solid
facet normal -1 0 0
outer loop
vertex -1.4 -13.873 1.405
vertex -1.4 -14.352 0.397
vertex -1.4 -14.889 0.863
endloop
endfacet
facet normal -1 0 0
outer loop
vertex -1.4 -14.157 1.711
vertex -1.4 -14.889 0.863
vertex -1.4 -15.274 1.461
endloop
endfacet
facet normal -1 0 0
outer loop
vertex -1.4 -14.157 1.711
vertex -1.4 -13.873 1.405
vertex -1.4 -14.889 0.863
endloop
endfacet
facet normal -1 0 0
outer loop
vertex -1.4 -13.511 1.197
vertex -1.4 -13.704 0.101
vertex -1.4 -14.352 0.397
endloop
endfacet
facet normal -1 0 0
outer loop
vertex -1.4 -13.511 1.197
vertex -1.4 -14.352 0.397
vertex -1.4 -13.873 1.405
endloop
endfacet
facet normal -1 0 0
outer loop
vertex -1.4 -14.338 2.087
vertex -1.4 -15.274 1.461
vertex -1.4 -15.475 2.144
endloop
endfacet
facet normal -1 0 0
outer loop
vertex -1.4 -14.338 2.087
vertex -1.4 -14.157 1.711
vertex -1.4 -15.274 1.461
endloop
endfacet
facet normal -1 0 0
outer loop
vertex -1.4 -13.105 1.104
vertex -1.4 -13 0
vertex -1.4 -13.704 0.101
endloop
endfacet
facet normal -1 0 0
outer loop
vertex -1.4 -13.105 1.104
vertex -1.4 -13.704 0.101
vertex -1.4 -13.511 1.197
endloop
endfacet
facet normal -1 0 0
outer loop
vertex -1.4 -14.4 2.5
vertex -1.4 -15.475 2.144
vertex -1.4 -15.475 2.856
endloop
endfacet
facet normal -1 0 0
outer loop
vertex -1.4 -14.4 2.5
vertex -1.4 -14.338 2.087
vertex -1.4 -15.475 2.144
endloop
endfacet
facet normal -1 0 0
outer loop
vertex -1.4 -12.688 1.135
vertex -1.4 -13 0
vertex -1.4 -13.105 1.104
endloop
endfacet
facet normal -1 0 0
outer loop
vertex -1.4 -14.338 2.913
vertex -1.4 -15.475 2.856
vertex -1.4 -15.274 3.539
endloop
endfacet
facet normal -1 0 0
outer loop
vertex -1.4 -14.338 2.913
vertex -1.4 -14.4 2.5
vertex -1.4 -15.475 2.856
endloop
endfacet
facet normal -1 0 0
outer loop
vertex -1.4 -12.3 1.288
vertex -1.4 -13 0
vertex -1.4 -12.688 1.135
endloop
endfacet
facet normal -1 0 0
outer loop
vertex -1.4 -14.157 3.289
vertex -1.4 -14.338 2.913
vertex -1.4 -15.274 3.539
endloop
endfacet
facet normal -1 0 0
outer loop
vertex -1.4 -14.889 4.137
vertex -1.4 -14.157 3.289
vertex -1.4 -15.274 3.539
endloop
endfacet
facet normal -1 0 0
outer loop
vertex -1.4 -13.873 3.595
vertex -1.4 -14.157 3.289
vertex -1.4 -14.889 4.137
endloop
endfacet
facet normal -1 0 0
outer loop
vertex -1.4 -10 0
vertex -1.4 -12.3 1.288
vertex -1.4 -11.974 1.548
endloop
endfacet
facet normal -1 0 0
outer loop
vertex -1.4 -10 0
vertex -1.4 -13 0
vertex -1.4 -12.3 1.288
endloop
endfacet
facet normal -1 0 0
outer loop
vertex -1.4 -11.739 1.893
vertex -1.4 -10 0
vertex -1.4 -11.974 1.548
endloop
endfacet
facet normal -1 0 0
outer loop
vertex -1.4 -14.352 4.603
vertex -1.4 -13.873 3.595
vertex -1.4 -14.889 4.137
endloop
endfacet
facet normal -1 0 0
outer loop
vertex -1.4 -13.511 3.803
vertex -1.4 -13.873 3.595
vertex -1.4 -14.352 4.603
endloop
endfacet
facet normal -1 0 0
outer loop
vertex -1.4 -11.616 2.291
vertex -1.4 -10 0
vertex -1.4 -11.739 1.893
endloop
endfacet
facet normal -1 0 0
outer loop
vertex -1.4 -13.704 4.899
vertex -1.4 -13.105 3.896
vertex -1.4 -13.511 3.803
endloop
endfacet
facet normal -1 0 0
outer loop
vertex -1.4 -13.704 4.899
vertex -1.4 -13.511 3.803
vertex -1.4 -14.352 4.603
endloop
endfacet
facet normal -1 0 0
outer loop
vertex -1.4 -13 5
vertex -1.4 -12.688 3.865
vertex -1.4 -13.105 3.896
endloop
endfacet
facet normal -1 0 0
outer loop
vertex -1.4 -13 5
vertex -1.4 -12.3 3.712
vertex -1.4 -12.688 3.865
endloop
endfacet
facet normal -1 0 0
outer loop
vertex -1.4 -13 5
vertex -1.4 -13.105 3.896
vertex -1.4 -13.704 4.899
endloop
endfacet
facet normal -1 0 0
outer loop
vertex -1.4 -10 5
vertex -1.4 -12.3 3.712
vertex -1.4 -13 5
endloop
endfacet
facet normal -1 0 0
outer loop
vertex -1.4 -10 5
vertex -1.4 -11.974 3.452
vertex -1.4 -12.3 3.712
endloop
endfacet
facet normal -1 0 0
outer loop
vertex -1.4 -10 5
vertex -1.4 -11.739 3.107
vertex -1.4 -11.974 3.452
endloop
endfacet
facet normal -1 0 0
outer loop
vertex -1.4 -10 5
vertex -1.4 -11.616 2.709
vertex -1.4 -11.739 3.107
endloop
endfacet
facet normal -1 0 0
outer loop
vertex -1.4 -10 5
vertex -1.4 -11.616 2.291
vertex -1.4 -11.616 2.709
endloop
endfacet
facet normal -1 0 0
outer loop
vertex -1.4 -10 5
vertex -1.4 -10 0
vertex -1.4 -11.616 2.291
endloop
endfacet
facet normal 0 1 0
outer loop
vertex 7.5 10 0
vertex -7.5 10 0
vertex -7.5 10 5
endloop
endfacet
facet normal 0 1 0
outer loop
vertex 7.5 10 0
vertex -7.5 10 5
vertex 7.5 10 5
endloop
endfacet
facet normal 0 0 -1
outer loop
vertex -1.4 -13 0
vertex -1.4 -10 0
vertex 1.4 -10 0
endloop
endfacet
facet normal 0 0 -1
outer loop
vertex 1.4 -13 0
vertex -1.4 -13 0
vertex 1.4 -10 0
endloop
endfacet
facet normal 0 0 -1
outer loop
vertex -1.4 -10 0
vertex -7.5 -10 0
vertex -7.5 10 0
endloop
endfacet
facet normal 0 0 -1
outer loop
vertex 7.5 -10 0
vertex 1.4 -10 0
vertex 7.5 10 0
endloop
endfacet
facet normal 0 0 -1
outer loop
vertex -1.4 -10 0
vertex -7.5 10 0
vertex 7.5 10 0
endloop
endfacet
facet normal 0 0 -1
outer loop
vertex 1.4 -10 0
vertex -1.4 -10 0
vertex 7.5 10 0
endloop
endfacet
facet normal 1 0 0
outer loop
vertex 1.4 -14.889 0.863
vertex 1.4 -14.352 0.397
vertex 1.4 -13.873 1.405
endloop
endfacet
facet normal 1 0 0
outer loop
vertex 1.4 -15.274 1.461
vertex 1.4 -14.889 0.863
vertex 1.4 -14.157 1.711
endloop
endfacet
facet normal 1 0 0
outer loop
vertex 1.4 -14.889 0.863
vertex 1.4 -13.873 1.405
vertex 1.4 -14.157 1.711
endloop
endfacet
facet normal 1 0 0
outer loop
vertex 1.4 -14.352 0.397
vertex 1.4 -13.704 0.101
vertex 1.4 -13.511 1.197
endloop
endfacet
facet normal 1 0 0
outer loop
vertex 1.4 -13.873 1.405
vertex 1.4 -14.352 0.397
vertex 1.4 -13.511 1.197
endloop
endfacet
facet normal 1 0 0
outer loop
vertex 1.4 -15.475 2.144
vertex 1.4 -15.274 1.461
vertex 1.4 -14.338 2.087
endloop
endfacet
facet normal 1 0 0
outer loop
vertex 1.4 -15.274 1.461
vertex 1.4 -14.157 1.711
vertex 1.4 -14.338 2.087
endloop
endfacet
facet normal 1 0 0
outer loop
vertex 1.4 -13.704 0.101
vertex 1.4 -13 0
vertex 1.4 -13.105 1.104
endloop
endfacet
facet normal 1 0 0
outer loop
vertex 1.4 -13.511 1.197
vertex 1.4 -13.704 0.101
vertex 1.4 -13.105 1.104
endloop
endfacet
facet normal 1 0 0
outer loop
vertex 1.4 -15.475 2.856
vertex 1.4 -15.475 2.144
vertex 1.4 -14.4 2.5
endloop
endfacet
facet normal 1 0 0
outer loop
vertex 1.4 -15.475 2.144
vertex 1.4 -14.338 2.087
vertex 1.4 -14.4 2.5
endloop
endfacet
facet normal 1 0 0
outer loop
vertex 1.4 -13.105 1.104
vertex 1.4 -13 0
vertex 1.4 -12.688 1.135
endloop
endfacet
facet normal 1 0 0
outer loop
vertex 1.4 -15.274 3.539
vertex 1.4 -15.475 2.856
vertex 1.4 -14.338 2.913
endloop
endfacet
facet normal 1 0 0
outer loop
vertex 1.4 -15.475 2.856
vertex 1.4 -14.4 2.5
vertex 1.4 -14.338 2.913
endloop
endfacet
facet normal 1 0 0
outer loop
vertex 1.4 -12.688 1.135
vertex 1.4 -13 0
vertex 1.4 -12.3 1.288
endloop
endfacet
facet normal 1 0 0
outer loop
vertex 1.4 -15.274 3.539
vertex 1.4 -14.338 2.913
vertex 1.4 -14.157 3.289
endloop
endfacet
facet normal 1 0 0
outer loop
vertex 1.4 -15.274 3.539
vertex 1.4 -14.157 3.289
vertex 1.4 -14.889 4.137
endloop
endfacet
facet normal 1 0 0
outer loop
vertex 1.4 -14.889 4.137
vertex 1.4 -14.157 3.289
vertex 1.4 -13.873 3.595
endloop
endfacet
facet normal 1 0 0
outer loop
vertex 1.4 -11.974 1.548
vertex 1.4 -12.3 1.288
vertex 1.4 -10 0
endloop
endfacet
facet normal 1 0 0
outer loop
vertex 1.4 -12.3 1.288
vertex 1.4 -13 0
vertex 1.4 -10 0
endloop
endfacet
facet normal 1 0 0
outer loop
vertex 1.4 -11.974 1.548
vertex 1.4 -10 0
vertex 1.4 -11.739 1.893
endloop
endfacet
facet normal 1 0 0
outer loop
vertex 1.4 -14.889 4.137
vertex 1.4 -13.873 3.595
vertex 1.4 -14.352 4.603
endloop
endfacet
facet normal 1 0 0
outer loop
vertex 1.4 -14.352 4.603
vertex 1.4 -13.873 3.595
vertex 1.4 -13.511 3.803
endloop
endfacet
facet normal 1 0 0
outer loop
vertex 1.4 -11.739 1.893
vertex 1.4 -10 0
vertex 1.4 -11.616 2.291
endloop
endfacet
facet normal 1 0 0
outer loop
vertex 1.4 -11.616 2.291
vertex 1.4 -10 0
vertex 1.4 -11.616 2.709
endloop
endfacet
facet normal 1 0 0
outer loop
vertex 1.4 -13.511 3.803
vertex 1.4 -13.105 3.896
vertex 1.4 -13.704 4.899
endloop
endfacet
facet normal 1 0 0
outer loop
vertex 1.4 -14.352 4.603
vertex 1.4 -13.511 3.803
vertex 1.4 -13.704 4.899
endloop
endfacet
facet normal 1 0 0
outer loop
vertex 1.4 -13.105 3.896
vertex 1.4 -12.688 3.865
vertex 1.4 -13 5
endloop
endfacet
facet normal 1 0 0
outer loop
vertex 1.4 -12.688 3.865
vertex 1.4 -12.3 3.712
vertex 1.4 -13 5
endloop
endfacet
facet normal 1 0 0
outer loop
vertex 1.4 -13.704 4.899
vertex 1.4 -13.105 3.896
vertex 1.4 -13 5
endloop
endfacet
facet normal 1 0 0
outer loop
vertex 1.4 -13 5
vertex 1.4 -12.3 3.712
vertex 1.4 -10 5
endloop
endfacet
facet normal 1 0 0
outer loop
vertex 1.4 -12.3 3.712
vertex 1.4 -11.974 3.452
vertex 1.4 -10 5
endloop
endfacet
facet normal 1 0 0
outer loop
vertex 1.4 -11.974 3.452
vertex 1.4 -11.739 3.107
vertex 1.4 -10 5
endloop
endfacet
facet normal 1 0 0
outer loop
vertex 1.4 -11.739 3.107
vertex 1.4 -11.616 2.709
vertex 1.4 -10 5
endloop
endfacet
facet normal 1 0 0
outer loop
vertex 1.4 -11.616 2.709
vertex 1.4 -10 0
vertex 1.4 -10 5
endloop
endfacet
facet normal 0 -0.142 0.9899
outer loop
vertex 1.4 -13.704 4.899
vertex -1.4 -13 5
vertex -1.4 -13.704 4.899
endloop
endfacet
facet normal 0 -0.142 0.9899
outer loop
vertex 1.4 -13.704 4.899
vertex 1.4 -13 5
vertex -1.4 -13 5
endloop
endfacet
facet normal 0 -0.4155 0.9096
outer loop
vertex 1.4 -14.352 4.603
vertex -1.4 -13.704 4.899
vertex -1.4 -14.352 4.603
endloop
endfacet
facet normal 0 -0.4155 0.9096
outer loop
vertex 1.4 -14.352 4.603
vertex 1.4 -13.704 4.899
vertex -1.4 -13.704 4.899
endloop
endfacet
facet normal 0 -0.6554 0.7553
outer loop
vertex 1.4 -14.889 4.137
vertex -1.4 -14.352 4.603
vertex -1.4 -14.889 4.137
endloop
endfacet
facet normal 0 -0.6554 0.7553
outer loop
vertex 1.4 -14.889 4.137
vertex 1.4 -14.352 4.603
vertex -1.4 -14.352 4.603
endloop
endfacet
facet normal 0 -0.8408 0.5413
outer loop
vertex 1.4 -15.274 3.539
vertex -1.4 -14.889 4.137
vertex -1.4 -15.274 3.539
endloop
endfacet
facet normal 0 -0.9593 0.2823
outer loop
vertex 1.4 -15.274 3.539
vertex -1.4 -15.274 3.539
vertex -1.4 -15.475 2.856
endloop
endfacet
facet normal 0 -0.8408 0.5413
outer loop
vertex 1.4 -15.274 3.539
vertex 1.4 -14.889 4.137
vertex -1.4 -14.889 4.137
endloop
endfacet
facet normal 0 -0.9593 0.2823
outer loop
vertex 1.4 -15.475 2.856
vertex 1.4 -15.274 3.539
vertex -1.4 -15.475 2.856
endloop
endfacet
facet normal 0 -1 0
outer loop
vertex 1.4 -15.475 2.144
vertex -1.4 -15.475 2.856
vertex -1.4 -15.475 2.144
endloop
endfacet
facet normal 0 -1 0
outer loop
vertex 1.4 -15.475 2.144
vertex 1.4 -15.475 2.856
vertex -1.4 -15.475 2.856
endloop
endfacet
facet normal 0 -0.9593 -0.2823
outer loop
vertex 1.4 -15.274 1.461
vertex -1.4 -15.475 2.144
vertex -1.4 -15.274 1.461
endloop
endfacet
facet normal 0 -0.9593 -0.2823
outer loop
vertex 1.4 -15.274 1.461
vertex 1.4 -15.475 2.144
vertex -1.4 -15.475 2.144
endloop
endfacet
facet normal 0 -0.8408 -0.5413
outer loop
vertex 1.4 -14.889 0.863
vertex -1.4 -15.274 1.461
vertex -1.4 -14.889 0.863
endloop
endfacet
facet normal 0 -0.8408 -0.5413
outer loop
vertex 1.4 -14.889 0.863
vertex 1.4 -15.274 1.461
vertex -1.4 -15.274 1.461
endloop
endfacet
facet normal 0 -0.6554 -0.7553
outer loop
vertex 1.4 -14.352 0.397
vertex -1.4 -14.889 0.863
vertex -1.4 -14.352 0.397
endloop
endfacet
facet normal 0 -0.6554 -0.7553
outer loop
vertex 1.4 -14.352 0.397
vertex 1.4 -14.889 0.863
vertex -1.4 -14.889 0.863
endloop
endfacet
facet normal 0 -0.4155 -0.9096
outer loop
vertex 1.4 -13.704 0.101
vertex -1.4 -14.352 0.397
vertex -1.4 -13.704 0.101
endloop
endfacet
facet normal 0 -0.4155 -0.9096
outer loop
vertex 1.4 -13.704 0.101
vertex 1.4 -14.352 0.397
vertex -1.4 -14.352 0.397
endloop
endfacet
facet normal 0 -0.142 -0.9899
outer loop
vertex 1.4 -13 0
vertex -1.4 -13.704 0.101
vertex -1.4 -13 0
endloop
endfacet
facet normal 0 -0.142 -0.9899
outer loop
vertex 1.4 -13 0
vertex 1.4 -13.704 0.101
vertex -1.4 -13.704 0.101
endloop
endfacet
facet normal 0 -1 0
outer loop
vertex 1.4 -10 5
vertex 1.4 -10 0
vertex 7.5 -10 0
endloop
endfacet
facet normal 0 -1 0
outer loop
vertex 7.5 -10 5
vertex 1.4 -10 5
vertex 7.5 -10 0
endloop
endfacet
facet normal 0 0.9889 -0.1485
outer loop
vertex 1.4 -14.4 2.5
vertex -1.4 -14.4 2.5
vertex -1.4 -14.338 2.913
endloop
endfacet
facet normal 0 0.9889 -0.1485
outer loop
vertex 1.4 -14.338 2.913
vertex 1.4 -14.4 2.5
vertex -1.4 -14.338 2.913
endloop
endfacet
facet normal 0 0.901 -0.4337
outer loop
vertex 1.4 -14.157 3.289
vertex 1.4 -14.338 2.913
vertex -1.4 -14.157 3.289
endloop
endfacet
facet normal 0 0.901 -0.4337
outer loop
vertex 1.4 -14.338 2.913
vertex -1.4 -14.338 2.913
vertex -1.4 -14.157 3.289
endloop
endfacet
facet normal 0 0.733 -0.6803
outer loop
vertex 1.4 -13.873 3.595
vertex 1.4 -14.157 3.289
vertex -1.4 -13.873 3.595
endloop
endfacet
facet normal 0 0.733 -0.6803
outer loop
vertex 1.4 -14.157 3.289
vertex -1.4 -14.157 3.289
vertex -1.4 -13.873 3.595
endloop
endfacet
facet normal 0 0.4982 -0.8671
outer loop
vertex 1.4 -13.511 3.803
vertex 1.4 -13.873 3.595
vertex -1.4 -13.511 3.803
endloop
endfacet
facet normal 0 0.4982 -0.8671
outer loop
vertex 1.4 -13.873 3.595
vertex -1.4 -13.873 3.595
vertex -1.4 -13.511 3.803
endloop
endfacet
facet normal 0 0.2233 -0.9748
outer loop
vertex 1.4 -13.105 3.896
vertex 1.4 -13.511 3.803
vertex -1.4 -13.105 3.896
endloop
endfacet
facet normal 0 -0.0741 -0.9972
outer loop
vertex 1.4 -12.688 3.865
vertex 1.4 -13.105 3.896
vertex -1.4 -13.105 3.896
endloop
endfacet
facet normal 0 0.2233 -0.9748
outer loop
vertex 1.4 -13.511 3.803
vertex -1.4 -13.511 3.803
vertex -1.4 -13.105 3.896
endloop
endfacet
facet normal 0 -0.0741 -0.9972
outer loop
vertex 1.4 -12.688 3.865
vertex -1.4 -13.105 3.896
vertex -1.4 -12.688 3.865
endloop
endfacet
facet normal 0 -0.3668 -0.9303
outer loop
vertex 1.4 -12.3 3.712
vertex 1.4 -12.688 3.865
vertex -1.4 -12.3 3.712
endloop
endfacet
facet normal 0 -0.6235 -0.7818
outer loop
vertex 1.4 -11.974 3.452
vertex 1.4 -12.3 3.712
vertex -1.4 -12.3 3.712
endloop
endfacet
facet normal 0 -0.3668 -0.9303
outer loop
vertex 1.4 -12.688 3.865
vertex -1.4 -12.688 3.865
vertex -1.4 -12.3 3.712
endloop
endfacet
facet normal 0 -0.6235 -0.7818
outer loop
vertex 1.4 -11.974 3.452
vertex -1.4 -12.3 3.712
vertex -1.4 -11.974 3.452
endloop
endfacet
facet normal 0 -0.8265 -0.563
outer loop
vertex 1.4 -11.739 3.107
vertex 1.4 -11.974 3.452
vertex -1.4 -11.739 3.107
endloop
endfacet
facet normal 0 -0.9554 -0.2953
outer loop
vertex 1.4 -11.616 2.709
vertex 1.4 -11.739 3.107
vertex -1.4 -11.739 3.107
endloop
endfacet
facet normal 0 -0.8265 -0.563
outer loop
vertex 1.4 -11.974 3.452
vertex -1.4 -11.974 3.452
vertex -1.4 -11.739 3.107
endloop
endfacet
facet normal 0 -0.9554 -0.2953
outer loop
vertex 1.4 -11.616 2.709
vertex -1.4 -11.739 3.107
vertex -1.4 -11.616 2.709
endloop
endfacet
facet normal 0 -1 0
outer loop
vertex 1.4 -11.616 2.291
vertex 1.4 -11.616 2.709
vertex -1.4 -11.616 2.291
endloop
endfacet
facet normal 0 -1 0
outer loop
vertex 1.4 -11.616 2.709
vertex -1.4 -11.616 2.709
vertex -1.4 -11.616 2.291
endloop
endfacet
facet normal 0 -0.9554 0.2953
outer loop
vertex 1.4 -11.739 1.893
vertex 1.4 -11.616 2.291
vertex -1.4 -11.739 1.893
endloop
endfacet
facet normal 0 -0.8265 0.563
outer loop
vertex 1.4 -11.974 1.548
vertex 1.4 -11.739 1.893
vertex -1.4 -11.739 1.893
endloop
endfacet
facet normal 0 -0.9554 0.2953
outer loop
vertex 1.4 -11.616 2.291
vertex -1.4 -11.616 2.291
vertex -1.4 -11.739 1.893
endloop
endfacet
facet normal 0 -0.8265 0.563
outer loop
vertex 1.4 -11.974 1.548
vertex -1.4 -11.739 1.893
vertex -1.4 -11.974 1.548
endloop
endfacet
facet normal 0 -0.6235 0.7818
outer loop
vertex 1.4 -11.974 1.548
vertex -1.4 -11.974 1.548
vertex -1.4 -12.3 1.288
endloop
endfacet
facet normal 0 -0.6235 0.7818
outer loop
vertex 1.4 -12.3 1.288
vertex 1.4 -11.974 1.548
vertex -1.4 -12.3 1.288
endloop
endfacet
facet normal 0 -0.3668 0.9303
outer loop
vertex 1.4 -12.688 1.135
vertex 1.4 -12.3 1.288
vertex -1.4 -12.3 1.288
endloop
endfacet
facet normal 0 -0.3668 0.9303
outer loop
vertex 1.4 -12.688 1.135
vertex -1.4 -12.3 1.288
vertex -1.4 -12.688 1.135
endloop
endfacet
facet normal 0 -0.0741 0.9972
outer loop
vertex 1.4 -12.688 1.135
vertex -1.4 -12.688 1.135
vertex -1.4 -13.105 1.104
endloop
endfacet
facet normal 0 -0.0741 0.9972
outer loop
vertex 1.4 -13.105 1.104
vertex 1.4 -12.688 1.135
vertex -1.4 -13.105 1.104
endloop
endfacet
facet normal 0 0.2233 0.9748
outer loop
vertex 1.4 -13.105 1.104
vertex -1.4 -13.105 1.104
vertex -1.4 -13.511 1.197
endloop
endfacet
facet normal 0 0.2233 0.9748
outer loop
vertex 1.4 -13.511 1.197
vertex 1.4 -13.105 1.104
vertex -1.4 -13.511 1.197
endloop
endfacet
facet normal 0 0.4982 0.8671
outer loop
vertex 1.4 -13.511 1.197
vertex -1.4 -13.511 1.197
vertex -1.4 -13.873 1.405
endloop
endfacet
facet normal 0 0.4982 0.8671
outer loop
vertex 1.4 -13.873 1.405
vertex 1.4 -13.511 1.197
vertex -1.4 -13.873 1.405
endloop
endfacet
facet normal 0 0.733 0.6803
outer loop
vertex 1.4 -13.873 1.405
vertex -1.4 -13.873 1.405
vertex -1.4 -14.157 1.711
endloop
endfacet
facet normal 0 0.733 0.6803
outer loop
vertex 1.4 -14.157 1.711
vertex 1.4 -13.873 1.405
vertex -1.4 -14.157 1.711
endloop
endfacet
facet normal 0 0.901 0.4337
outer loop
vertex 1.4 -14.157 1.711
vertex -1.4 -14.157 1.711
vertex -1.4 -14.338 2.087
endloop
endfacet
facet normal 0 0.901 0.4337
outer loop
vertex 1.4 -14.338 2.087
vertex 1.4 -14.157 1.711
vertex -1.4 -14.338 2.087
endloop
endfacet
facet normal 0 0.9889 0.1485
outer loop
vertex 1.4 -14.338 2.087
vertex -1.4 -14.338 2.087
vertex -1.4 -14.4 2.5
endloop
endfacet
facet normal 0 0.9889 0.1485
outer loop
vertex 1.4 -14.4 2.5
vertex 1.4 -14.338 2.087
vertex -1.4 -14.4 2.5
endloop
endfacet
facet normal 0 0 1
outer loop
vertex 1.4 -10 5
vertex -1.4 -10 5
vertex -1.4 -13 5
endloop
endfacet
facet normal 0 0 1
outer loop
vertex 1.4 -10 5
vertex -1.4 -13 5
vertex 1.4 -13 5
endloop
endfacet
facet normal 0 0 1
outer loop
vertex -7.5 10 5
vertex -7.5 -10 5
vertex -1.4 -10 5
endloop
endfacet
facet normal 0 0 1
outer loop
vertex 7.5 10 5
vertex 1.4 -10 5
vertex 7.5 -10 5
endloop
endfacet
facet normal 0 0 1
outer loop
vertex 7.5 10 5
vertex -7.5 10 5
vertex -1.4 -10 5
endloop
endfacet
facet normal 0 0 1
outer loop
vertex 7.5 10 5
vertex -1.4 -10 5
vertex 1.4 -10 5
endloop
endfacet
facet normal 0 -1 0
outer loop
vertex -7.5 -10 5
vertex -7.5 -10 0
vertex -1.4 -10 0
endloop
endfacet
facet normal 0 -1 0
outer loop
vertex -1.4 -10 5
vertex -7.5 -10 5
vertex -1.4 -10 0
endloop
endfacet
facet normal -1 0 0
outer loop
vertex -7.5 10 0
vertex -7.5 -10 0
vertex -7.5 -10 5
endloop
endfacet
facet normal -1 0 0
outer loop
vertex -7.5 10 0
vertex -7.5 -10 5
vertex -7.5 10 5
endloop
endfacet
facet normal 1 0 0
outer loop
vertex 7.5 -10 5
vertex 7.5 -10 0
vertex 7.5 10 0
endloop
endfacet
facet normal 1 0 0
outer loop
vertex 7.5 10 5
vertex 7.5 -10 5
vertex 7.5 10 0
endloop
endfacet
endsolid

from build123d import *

# Parameters (mm, degrees)
F0_W     = 15
F0_H     = 20
F1_DEPTH = 5
F2_W     = 2.8
F2_H     = 5
F3_DEPTH = 3
F4_W     = 2.8
F4_H     = 2.5
F6_R     = 1.4
F7_DEPTH = 5


with BuildPart() as f1:
    # F0 (on Top) → F1 (new body)
    with BuildSketch(Plane.XY):
        Rectangle(F0_W, F0_H)
    extrude(amount=F1_DEPTH)

    # F2 (on face) → F3 (join)
    with BuildSketch(Plane.XZ.offset(10)):
        with Locations((0, 2.5)):
            Rectangle(F2_W, F2_H)
    extrude(amount=F3_DEPTH)

    # F4 (on face) → F5 (revolve)
    with BuildSketch(Plane.XZ.offset(13)):
        with Locations((0, 1.25)):
            Rectangle(F4_W, F4_H)
    revolve(axis=Axis((0, -13, 2.5), (1, 0, 0)))

    # F6 (on face) → F7 (cut)
    with BuildSketch(Plane(origin=(-1.4, 0, 0), x_dir=(0, -1, 0), z_dir=(-1, 0, 0))):
        with Locations((13, 2.5)):
            Circle(F6_R)
    extrude(amount=-F7_DEPTH, mode=Mode.SUBTRACT)


solid = f1.part
